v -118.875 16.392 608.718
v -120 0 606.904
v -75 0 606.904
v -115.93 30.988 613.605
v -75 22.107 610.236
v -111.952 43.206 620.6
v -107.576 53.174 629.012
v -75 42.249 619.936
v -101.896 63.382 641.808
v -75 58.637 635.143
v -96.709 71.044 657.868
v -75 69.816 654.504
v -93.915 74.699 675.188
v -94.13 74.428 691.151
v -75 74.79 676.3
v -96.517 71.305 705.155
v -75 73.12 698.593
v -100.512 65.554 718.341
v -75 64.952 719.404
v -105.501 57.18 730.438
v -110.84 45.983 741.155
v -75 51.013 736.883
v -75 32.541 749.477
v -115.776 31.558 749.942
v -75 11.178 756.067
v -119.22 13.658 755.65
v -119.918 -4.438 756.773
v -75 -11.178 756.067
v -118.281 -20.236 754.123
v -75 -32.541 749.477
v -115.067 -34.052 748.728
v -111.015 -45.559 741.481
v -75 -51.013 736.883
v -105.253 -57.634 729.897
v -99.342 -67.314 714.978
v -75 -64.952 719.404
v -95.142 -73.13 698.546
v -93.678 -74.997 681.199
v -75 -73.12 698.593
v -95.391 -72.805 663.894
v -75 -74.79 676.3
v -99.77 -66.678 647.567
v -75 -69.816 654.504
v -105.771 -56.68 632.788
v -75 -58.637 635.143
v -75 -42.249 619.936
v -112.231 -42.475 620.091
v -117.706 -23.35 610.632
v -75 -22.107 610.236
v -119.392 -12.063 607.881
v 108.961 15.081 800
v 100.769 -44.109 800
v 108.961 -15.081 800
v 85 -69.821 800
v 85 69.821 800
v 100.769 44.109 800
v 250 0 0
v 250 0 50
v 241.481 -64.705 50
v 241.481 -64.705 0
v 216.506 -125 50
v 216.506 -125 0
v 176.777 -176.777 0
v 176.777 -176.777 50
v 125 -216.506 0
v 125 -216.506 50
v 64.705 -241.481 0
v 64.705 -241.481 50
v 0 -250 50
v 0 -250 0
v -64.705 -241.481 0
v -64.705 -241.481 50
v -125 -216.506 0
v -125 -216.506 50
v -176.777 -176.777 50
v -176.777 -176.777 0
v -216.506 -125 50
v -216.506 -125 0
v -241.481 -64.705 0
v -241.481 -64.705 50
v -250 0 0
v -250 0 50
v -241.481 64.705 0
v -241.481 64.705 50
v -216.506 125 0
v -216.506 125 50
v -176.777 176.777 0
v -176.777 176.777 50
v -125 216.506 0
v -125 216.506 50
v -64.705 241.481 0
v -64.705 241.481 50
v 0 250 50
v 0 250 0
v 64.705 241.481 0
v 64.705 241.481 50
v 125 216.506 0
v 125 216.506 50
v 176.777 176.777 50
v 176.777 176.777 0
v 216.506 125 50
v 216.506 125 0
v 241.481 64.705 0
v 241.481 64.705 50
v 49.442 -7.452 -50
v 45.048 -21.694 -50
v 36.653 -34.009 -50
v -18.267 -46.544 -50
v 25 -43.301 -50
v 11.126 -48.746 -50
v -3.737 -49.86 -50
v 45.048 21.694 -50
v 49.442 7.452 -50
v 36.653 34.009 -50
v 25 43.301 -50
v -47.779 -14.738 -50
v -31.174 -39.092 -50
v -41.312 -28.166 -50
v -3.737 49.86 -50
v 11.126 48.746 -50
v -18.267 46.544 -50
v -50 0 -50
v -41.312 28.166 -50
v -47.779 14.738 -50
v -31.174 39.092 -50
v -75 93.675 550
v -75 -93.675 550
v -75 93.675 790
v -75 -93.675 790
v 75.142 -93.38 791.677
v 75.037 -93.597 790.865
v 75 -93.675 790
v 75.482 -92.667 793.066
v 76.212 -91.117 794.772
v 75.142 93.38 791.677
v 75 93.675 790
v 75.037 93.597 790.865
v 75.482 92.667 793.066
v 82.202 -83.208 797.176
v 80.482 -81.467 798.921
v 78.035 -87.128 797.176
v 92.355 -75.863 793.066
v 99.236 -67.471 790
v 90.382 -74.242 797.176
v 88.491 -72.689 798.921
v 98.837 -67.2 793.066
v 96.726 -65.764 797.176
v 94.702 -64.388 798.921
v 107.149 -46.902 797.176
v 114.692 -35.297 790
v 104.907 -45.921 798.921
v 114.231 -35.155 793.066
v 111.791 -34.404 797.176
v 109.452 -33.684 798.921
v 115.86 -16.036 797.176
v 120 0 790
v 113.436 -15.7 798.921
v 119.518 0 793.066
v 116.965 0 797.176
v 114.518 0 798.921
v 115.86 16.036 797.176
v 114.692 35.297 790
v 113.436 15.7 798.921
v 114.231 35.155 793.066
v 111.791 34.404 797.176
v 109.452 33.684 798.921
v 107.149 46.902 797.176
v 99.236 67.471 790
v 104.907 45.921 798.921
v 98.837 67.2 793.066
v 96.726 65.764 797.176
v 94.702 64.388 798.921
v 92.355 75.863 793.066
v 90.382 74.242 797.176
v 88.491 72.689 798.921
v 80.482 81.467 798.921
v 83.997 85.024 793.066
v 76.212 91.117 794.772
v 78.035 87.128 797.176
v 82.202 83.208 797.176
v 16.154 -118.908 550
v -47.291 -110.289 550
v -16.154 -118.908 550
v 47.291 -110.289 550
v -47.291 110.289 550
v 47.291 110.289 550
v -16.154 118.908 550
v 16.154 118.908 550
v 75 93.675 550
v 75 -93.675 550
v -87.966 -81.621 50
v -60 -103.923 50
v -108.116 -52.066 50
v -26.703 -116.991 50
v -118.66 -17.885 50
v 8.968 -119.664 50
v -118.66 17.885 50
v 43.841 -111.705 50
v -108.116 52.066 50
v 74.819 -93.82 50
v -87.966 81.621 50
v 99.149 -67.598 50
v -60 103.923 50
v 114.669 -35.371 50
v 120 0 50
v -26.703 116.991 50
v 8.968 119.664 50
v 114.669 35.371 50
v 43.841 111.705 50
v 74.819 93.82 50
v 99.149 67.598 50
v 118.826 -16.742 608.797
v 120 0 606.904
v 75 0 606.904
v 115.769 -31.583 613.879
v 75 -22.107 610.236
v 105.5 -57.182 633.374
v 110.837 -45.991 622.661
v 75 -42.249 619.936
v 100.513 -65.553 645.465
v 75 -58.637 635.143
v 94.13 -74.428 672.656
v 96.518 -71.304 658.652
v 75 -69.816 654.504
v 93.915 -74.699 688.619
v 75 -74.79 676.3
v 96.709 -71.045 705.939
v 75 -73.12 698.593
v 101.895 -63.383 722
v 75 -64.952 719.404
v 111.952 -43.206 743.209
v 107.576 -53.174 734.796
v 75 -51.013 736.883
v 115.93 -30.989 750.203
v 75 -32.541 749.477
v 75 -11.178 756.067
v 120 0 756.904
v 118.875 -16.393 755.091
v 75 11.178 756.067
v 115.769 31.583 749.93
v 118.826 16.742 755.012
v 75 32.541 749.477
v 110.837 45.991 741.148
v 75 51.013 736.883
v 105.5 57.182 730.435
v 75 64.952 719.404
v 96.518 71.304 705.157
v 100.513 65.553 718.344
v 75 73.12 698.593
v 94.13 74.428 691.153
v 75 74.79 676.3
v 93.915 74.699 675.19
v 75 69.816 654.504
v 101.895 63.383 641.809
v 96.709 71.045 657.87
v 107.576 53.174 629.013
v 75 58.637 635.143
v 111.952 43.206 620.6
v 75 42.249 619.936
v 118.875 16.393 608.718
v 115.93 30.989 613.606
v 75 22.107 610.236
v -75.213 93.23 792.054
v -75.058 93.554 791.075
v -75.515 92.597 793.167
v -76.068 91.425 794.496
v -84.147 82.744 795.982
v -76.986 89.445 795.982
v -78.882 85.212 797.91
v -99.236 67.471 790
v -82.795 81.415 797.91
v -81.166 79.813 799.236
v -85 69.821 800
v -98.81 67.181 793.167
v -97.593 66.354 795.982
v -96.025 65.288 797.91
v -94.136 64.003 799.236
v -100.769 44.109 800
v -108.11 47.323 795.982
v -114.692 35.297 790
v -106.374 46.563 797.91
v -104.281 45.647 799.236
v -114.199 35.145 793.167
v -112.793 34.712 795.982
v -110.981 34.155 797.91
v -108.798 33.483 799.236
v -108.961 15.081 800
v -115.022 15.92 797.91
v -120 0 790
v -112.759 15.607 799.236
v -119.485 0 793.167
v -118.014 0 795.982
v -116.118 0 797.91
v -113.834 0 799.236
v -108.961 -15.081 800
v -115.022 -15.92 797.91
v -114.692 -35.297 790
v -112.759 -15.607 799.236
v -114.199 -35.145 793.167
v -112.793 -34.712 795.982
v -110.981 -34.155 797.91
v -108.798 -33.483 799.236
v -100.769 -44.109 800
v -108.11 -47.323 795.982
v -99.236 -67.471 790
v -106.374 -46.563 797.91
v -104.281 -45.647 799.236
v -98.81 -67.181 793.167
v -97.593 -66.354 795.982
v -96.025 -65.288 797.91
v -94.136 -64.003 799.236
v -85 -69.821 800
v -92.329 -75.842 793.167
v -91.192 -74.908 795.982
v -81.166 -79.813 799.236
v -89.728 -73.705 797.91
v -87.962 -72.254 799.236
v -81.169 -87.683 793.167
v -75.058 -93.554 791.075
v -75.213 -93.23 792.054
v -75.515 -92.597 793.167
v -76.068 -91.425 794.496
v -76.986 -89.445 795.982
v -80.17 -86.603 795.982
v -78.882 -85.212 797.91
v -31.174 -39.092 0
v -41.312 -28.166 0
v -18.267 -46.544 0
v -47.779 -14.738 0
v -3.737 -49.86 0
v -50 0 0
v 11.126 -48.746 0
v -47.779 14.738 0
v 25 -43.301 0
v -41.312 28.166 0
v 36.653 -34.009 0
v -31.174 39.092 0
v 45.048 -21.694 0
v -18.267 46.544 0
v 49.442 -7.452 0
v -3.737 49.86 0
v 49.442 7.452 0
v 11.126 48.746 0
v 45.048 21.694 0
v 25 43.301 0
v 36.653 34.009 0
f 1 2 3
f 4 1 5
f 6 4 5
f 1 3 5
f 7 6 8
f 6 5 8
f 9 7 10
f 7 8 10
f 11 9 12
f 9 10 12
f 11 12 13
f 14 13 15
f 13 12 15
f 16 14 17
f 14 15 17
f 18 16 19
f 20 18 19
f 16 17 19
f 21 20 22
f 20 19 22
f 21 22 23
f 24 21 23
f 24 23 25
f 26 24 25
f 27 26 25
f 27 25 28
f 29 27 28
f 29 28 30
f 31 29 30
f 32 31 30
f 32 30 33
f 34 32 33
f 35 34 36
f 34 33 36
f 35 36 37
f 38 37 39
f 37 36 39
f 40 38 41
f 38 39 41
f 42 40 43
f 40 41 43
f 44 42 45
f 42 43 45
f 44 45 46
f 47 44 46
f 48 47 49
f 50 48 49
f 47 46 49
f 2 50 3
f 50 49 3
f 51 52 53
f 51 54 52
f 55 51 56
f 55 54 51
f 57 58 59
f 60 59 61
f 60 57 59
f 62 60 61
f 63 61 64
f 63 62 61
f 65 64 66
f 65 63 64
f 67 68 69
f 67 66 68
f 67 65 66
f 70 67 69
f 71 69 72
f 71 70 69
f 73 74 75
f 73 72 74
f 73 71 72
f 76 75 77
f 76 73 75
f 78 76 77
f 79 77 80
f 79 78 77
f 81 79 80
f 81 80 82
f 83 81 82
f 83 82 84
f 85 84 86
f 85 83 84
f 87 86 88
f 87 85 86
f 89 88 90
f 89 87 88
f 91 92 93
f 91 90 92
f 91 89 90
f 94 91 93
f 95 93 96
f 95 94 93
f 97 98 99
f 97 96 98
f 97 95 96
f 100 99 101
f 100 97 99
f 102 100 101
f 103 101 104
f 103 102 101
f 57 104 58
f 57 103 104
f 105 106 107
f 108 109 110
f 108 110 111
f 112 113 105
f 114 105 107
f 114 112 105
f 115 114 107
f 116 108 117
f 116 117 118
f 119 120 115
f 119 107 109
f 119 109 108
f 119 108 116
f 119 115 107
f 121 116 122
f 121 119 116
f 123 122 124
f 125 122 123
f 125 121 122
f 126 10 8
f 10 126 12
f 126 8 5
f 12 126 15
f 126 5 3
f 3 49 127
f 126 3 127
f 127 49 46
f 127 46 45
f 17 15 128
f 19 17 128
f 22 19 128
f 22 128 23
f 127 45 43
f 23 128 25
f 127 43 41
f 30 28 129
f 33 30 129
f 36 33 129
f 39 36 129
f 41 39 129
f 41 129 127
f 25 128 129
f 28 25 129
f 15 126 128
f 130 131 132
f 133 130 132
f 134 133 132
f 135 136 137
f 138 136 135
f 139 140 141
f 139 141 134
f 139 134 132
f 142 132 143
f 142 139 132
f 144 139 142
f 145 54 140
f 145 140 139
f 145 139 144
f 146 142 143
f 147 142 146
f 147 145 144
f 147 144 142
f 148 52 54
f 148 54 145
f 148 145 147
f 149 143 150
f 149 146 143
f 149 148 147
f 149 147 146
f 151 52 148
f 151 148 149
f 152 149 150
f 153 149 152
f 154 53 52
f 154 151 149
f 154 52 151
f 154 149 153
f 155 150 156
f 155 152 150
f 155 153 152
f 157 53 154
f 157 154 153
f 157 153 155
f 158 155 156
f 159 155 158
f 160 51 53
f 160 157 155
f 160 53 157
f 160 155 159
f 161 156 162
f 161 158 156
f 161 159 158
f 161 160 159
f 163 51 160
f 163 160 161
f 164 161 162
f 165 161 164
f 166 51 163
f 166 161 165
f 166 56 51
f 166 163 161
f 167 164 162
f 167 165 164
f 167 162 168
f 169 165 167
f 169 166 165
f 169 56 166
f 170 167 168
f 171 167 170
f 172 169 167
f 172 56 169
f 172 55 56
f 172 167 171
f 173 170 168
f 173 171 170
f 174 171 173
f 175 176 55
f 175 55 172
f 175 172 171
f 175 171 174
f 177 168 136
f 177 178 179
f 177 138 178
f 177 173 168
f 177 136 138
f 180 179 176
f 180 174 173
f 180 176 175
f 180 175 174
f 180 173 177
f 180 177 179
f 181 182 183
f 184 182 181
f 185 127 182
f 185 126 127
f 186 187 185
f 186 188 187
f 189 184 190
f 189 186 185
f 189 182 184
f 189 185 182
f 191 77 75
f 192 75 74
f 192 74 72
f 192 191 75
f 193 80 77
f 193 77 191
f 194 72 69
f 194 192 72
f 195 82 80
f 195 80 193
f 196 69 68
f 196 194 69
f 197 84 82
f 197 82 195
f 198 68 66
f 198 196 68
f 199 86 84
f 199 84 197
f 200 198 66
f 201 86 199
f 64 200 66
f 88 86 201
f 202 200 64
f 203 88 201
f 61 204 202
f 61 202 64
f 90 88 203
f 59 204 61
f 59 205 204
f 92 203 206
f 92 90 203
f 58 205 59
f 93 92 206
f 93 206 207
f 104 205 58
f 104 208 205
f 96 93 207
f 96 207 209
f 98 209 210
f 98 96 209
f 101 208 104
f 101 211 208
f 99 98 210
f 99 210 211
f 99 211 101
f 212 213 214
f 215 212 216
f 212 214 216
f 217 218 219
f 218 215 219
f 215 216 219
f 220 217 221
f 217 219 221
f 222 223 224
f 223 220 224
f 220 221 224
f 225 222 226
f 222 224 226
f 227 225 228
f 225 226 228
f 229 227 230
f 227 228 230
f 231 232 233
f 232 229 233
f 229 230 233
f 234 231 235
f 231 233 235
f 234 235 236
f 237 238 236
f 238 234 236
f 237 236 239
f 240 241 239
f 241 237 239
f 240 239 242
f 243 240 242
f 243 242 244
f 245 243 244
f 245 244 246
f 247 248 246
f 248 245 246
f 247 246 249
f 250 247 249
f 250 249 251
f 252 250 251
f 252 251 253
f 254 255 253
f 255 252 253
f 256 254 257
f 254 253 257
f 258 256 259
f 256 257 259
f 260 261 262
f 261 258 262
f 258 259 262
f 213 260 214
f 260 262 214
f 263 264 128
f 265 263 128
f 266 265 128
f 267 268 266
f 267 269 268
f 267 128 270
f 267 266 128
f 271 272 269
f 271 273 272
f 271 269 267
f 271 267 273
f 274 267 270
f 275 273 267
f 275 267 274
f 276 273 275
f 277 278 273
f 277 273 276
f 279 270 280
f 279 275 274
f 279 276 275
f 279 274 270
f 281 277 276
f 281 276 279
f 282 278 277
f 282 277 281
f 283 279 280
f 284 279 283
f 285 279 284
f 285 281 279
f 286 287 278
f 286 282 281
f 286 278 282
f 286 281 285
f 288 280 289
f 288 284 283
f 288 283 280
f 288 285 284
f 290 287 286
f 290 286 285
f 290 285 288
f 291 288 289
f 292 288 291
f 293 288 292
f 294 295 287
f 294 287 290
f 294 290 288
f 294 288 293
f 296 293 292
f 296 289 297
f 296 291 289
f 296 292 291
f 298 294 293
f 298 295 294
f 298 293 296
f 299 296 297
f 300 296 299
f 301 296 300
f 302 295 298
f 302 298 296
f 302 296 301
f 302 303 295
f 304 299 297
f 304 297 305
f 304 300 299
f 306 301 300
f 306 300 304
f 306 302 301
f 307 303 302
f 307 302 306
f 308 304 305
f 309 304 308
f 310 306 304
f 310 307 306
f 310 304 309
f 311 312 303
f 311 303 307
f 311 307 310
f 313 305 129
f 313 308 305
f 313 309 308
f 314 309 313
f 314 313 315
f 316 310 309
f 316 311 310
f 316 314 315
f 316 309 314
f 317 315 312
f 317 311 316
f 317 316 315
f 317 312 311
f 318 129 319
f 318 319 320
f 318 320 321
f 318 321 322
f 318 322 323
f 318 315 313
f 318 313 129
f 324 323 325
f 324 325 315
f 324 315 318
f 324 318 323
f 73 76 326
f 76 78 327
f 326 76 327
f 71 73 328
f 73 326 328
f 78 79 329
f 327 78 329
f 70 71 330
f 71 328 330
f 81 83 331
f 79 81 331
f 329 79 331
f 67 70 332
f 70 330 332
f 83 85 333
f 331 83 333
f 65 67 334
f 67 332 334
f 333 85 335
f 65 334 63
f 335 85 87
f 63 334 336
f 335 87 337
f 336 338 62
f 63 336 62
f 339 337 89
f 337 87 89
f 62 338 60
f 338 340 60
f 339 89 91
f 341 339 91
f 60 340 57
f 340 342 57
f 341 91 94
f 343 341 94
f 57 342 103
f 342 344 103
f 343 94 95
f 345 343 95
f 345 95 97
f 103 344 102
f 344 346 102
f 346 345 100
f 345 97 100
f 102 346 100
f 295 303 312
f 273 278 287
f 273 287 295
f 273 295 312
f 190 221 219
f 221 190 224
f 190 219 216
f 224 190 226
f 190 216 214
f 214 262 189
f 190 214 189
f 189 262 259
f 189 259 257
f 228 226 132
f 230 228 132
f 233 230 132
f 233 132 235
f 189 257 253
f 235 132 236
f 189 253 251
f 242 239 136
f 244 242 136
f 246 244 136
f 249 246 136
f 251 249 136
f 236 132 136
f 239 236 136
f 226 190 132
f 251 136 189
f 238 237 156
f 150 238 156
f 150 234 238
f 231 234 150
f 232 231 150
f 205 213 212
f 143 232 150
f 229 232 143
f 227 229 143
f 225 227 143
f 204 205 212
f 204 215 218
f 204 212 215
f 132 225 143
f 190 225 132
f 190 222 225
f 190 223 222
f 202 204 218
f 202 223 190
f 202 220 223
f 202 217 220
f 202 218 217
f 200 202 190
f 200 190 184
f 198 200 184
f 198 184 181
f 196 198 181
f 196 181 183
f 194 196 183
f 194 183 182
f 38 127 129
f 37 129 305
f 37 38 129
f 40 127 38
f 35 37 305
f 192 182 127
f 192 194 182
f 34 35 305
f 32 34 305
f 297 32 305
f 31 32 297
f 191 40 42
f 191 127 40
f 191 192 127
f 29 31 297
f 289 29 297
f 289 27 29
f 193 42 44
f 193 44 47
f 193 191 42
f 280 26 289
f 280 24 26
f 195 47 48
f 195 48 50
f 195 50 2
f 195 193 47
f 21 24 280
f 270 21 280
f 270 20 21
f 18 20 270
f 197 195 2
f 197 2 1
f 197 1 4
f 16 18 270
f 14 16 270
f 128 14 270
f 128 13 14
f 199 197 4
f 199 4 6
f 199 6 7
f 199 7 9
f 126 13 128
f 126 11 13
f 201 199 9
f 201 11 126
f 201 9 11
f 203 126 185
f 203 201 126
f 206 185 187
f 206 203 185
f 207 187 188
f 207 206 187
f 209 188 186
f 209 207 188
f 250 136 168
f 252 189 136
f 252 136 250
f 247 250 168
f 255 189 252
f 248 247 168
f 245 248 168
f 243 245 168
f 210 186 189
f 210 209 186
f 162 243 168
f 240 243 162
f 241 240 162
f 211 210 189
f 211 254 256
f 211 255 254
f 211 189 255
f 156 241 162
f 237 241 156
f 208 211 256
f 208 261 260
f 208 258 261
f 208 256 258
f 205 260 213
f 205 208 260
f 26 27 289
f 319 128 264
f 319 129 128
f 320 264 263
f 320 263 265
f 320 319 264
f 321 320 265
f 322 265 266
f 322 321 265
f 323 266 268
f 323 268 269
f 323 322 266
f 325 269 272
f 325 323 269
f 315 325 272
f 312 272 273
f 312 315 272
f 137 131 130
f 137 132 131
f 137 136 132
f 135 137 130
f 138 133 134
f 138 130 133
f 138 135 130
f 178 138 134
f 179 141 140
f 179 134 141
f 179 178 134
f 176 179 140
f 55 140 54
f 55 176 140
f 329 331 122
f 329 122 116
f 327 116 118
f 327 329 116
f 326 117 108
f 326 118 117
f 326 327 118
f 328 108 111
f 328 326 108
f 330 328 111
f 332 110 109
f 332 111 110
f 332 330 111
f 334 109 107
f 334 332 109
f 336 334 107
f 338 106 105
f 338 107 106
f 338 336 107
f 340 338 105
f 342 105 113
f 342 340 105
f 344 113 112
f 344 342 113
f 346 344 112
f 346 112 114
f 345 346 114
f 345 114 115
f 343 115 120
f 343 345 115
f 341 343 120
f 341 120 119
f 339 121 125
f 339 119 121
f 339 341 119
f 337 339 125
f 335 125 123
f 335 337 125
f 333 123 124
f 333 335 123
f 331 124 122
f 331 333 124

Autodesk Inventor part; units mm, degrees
ref_plane "YZ Plane" through (0, 0, 0) normal (1, 0, 0) x (0, 1, 0)
ref_plane "XZ Plane" through (0, 0, 0) normal (0, 1, 0) x (-1, 0, 0)
ref_plane "XY Plane" through (0, 0, 0) normal (0, 0, 1) x (1, 0, 0)
sketch "Sketch1" plane through (0, 0, 0) normal (0, 0, 1) x (1, 0, 0)
  circle A0 centre (0, 0) radius 250
  dimension "d0" = 500
extrude "Extrusion1" add sketch "Sketch1" along normal blind 50
sketch "Sketch2" plane through (0, 0, 50) normal (0, 0, 1) x (1, 0, 0)
  circle A0 centre (0, 0) radius 120
  dimension "d3" = 240
extrude "Extrusion2" add sketch "Sketch2" along normal blind 750
sketch "Sketch3" plane through (0, 0, 800) normal (0, 0, 1) x (1, 0, 0)
  line L0 (-75, -121) -> (75, -121)
  line L1 (75, -121) -> (75, 121)
  line L2 (75, 121) -> (-75, 121)
  line L3 (-75, 121) -> (-75, -121)
  line L4 (-75, -121) -> (75, 121) construction
  line L5 (75, -121) -> (-75, 121) construction
  point P0 (0, 0)
  dimension "d6" = 150
  dimension "d7" = 150
  dimension "d8" = 121
extrude "Extrusion3" cut sketch "Sketch3" against normal blind 250
sketch "Sketch4" plane through (-75, -93.675, 800) normal (1, 0, 0) x (0, 0, -1)
  circle A0 centre (118.0956, 93.675) radius 75
  point P0 (800, 93.675)
  dimension "d11" = 150
extrude "Extrusion4" cut sketch "Sketch4" along normal mid plane 500
fillet "Fillet1" radius 10 5 edges at (-120, 0, 800) (-75, 0, 800) (75, 0, 800) (108.1665, -51.9615, 800) (108.1665, 51.9615, 800)
sketch "Sketch5" plane through (0, 0, 0) normal (0, 0, -1) x (-1, 0, 0)
  circle A0 centre (0, 0) radius 50
  dimension "d15" = 100
extrude "Extrusion5" add sketch "Sketch5" along normal blind 50
properties part number "Part1final" material "Steel, Carbon"
